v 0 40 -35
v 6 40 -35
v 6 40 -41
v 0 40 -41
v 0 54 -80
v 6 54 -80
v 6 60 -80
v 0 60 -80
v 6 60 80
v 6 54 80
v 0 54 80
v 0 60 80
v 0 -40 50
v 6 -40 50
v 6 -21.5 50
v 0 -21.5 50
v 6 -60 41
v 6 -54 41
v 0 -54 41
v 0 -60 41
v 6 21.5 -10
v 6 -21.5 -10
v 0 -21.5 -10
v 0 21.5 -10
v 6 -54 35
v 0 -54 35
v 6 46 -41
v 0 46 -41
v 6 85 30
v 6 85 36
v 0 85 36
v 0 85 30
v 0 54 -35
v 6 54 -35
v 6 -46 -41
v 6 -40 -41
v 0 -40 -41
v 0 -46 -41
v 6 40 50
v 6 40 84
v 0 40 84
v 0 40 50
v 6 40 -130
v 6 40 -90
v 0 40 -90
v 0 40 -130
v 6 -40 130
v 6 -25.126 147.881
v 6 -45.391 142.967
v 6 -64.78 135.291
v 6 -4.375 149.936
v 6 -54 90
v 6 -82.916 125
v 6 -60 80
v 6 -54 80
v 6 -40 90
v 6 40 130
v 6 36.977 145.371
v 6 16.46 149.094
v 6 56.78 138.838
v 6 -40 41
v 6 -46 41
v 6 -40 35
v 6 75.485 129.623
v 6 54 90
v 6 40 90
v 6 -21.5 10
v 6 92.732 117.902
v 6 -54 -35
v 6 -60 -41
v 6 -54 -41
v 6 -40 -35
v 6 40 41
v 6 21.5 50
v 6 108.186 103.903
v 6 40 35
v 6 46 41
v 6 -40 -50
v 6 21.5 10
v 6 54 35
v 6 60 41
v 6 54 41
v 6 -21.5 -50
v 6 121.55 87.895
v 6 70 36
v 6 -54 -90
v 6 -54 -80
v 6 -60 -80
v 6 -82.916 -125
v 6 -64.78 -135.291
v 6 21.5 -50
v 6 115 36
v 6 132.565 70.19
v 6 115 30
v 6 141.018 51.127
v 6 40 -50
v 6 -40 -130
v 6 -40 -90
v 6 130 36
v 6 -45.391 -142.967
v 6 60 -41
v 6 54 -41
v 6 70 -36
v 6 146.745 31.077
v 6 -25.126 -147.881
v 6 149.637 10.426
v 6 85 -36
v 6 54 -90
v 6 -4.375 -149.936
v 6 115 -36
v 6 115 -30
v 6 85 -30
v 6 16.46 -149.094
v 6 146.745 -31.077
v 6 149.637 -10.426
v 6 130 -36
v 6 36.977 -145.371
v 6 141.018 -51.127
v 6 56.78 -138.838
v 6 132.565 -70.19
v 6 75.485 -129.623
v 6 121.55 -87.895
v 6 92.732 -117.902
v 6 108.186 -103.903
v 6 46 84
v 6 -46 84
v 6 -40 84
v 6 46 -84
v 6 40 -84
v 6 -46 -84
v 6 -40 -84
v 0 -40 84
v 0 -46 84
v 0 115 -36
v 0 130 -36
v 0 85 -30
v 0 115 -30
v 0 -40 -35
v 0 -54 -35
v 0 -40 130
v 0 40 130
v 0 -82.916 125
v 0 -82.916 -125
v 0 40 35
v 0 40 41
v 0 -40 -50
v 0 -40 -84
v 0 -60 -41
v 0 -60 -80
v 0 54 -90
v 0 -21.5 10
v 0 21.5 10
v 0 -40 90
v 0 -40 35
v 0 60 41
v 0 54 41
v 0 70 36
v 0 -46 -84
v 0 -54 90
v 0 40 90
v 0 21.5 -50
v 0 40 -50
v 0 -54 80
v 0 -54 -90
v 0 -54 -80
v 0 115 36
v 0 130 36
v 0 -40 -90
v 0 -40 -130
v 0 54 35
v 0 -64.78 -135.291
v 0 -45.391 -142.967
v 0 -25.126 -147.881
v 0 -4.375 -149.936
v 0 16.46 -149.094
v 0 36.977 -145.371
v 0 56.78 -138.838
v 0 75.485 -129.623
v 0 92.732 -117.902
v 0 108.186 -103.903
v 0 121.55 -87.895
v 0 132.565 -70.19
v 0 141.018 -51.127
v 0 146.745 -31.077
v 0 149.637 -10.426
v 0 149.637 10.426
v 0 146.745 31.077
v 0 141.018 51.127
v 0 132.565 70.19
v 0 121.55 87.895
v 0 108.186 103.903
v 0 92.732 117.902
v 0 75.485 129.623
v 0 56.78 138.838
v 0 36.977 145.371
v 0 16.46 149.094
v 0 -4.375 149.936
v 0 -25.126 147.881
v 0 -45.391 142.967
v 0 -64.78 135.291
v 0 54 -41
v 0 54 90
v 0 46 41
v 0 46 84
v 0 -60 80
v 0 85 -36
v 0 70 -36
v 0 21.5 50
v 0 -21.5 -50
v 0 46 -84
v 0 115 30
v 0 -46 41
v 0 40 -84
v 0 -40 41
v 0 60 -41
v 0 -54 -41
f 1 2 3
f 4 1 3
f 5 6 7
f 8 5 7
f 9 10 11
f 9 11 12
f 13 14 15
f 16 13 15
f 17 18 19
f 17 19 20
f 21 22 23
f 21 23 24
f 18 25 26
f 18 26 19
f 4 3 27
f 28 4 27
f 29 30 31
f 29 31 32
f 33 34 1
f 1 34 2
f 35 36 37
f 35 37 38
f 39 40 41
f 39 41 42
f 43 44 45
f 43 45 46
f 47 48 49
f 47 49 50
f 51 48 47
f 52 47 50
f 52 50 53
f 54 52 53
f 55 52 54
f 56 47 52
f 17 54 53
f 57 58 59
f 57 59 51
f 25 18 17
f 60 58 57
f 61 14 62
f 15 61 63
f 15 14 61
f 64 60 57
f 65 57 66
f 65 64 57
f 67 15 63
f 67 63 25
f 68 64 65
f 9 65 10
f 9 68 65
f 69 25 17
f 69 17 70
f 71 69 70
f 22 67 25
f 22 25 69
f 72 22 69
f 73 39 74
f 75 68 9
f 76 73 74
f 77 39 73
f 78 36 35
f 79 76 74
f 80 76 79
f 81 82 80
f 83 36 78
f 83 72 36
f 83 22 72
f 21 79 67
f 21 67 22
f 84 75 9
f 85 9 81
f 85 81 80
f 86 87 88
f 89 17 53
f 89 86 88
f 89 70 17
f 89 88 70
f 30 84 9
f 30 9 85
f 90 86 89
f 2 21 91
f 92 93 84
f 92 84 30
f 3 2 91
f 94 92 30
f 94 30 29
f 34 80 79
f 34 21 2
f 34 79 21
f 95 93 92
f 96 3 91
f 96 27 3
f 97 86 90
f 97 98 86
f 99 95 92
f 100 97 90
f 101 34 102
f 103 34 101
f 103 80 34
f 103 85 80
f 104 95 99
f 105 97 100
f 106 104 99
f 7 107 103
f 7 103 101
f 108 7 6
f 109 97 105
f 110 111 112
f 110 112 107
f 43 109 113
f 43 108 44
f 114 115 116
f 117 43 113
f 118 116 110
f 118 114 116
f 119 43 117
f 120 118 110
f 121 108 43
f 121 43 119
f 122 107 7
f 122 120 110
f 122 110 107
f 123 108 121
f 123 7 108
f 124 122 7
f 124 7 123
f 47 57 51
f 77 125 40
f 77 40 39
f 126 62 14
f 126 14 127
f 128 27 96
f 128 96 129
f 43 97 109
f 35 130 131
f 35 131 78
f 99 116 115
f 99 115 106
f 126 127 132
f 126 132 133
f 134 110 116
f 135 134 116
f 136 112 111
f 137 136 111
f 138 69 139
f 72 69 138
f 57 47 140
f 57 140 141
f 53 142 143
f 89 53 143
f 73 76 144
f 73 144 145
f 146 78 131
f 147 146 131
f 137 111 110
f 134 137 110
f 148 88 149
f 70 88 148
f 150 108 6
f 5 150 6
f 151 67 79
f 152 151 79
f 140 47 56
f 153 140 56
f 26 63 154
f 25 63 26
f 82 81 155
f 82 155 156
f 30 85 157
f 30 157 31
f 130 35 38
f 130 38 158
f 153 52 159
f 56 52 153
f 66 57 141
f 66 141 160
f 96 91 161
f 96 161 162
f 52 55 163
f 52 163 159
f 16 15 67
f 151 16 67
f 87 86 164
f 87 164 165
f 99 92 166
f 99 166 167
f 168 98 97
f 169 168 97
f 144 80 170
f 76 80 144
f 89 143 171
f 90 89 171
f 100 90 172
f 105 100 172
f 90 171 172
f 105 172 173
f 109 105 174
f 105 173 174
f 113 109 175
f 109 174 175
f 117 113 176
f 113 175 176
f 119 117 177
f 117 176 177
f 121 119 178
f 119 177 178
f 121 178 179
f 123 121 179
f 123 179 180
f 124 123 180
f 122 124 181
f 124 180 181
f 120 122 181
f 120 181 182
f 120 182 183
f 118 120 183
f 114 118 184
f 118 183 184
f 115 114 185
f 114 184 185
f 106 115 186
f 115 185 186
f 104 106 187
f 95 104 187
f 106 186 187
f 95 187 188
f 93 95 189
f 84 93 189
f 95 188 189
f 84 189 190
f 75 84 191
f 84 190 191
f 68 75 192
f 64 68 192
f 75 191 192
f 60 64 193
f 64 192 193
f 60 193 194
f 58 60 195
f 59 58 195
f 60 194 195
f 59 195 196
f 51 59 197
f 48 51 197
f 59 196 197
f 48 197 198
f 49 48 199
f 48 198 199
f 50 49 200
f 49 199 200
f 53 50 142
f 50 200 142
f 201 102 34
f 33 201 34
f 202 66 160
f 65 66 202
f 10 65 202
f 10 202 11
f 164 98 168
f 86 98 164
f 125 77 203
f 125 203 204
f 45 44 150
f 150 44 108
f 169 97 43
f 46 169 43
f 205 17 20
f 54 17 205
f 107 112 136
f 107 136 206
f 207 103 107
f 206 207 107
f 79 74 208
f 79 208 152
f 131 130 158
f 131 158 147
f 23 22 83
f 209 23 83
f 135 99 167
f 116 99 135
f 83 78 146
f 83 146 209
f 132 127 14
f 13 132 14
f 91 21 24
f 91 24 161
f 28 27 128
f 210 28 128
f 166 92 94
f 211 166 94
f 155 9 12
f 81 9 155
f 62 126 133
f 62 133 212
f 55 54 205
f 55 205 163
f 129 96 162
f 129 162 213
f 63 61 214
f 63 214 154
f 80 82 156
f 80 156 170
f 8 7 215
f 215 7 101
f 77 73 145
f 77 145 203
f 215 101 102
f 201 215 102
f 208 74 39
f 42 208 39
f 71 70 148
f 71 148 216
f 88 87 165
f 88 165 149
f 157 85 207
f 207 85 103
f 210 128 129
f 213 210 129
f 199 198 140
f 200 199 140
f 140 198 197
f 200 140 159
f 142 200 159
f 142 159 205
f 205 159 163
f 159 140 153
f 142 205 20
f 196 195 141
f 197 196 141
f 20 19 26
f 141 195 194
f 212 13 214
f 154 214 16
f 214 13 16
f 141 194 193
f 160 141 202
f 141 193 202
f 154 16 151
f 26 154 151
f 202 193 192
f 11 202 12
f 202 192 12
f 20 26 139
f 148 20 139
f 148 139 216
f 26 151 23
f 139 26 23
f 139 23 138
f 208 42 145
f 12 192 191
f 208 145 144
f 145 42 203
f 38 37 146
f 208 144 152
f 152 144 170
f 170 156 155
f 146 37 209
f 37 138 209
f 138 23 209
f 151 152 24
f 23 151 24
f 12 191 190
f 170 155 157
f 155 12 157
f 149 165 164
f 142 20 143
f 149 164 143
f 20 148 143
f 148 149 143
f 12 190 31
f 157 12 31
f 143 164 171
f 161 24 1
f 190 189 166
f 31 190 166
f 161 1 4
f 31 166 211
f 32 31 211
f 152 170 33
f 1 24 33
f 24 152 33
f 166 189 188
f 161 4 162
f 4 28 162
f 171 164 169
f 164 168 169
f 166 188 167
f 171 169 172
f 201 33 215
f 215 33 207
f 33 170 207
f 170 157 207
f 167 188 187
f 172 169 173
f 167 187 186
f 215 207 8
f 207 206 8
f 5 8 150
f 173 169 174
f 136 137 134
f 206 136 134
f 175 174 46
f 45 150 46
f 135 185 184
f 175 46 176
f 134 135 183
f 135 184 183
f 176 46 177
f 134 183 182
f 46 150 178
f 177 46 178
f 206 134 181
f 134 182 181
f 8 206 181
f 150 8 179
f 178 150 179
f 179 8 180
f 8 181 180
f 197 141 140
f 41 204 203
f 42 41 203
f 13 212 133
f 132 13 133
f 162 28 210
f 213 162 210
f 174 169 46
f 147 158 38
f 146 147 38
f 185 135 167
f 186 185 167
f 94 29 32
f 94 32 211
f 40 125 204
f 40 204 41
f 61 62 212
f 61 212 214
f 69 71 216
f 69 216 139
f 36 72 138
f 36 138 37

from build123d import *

# Parameters (mm, degrees)
BOSS_EXTRUDE1_DEPTH = 6
SKETCH2_W           = 80
SKETCH2_H           = 80
CUT_EXTRUDE1_DEPTH  = 6
SKETCH3_W           = 60
SKETCH3_H           = 60
CUT_EXTRUDE2_DEPTH  = 6
CUT_EXTRUDE3_DEPTH  = 10
SKETCH6_W           = 40
SKETCH6_H           = 43
CUT_EXTRUDE4_DEPTH  = 7
SKETCH7_W           = 6
SKETCH7_H           = 15
CUT_EXTRUDE5_DEPTH  = 7


with BuildPart() as part:
    # Sketch1 → Boss-Extrude1 (new body)
    with BuildSketch(Plane(origin=(0, 0, 0), x_dir=(0, 0, -1), z_dir=(1, 0, 0))):
        with BuildLine():
            Line((-125, -82.915619759), (125, -82.915619759))
            ThreePointArc((125, -82.915619759), (0, 150), (-125, -82.915619759))
        make_face()
    extrude(amount=BOSS_EXTRUDE1_DEPTH)

    # Sketch2 → Cut-Extrude1 (cut)
    with BuildSketch(Plane(origin=(6, 0, 0), x_dir=(0, 0, -1), z_dir=(1, 0, 0))):
        with Locations((-90, 0)):
            Rectangle(SKETCH2_W, SKETCH2_H)
        with Locations((90, 0)):
            Rectangle(SKETCH2_W, SKETCH2_H)
    extrude(amount=-CUT_EXTRUDE1_DEPTH, mode=Mode.SUBTRACT)

    # Sketch3 → Cut-Extrude2 (cut)
    with BuildSketch(Plane(origin=(6, 0, 0), x_dir=(0, 0, -1), z_dir=(1, 0, 0))):
        with Locations((0, 100)):
            Rectangle(SKETCH3_W, SKETCH3_H)
    extrude(amount=-CUT_EXTRUDE2_DEPTH, mode=Mode.SUBTRACT)

    # Sketch4 → Cut-Extrude3 (cut)
    with BuildSketch(Plane(origin=(6, 0, 0), x_dir=(0, 0, -1), z_dir=(1, 0, 0))):
        Polygon((-90, -40), (-84, -40), (-84, -46), (-41, -46), (-41, -40), (-35, -40), (-35, -54), (-41, -54), (-41, -60), (-80, -60), (-80, -54), (-90, -54), align=None)
        Polygon((-80, 60), (-41, 60), (-41, 54), (-35, 54), (-35, 40), (-41, 40), (-41, 46), (-84, 46), (-84, 40), (-90, 40), (-90, 54), (-80, 54), align=None)
        Polygon((80, -60), (41, -60), (41, -54), (35, -54), (35, -40), (41, -40), (41, -46), (84, -46), (84, -40), (90, -40), (90, -54), (80, -54), align=None)
        Polygon((90, 40), (90, 54), (80, 54), (80, 60), (41, 60), (41, 54), (35, 54), (35, 40), (41, 40), (41, 46), (84, 46), (84, 40), align=None)
    extrude(amount=-CUT_EXTRUDE3_DEPTH, mode=Mode.SUBTRACT)

    # Sketch6 → Cut-Extrude4 (cut, through all)
    with BuildSketch(Plane(origin=(6, 0, 0), x_dir=(0, 0, -1), z_dir=(1, 0, 0))):
        with Locations((-30, 0)):
            Rectangle(SKETCH6_W, SKETCH6_H)
        with Locations((30, 0)):
            Rectangle(SKETCH6_W, SKETCH6_H)
    extrude(amount=-CUT_EXTRUDE4_DEPTH, mode=Mode.SUBTRACT)

    # Sketch7 → Cut-Extrude5 (cut, through all)
    with BuildSketch(Plane(origin=(6, 0, 0), x_dir=(0, 0, -1), z_dir=(1, 0, 0))):
        with Locations((-33, 122.5)):
            Rectangle(SKETCH7_W, SKETCH7_H)
        with Locations((-33, 77.5)):
            Rectangle(SKETCH7_W, SKETCH7_H)
        with Locations((33, 77.5)):
            Rectangle(SKETCH7_W, SKETCH7_H)
        with Locations((33, 122.5)):
            Rectangle(SKETCH7_W, SKETCH7_H)
    extrude(amount=-CUT_EXTRUDE5_DEPTH, mode=Mode.SUBTRACT)


solid = part.part
